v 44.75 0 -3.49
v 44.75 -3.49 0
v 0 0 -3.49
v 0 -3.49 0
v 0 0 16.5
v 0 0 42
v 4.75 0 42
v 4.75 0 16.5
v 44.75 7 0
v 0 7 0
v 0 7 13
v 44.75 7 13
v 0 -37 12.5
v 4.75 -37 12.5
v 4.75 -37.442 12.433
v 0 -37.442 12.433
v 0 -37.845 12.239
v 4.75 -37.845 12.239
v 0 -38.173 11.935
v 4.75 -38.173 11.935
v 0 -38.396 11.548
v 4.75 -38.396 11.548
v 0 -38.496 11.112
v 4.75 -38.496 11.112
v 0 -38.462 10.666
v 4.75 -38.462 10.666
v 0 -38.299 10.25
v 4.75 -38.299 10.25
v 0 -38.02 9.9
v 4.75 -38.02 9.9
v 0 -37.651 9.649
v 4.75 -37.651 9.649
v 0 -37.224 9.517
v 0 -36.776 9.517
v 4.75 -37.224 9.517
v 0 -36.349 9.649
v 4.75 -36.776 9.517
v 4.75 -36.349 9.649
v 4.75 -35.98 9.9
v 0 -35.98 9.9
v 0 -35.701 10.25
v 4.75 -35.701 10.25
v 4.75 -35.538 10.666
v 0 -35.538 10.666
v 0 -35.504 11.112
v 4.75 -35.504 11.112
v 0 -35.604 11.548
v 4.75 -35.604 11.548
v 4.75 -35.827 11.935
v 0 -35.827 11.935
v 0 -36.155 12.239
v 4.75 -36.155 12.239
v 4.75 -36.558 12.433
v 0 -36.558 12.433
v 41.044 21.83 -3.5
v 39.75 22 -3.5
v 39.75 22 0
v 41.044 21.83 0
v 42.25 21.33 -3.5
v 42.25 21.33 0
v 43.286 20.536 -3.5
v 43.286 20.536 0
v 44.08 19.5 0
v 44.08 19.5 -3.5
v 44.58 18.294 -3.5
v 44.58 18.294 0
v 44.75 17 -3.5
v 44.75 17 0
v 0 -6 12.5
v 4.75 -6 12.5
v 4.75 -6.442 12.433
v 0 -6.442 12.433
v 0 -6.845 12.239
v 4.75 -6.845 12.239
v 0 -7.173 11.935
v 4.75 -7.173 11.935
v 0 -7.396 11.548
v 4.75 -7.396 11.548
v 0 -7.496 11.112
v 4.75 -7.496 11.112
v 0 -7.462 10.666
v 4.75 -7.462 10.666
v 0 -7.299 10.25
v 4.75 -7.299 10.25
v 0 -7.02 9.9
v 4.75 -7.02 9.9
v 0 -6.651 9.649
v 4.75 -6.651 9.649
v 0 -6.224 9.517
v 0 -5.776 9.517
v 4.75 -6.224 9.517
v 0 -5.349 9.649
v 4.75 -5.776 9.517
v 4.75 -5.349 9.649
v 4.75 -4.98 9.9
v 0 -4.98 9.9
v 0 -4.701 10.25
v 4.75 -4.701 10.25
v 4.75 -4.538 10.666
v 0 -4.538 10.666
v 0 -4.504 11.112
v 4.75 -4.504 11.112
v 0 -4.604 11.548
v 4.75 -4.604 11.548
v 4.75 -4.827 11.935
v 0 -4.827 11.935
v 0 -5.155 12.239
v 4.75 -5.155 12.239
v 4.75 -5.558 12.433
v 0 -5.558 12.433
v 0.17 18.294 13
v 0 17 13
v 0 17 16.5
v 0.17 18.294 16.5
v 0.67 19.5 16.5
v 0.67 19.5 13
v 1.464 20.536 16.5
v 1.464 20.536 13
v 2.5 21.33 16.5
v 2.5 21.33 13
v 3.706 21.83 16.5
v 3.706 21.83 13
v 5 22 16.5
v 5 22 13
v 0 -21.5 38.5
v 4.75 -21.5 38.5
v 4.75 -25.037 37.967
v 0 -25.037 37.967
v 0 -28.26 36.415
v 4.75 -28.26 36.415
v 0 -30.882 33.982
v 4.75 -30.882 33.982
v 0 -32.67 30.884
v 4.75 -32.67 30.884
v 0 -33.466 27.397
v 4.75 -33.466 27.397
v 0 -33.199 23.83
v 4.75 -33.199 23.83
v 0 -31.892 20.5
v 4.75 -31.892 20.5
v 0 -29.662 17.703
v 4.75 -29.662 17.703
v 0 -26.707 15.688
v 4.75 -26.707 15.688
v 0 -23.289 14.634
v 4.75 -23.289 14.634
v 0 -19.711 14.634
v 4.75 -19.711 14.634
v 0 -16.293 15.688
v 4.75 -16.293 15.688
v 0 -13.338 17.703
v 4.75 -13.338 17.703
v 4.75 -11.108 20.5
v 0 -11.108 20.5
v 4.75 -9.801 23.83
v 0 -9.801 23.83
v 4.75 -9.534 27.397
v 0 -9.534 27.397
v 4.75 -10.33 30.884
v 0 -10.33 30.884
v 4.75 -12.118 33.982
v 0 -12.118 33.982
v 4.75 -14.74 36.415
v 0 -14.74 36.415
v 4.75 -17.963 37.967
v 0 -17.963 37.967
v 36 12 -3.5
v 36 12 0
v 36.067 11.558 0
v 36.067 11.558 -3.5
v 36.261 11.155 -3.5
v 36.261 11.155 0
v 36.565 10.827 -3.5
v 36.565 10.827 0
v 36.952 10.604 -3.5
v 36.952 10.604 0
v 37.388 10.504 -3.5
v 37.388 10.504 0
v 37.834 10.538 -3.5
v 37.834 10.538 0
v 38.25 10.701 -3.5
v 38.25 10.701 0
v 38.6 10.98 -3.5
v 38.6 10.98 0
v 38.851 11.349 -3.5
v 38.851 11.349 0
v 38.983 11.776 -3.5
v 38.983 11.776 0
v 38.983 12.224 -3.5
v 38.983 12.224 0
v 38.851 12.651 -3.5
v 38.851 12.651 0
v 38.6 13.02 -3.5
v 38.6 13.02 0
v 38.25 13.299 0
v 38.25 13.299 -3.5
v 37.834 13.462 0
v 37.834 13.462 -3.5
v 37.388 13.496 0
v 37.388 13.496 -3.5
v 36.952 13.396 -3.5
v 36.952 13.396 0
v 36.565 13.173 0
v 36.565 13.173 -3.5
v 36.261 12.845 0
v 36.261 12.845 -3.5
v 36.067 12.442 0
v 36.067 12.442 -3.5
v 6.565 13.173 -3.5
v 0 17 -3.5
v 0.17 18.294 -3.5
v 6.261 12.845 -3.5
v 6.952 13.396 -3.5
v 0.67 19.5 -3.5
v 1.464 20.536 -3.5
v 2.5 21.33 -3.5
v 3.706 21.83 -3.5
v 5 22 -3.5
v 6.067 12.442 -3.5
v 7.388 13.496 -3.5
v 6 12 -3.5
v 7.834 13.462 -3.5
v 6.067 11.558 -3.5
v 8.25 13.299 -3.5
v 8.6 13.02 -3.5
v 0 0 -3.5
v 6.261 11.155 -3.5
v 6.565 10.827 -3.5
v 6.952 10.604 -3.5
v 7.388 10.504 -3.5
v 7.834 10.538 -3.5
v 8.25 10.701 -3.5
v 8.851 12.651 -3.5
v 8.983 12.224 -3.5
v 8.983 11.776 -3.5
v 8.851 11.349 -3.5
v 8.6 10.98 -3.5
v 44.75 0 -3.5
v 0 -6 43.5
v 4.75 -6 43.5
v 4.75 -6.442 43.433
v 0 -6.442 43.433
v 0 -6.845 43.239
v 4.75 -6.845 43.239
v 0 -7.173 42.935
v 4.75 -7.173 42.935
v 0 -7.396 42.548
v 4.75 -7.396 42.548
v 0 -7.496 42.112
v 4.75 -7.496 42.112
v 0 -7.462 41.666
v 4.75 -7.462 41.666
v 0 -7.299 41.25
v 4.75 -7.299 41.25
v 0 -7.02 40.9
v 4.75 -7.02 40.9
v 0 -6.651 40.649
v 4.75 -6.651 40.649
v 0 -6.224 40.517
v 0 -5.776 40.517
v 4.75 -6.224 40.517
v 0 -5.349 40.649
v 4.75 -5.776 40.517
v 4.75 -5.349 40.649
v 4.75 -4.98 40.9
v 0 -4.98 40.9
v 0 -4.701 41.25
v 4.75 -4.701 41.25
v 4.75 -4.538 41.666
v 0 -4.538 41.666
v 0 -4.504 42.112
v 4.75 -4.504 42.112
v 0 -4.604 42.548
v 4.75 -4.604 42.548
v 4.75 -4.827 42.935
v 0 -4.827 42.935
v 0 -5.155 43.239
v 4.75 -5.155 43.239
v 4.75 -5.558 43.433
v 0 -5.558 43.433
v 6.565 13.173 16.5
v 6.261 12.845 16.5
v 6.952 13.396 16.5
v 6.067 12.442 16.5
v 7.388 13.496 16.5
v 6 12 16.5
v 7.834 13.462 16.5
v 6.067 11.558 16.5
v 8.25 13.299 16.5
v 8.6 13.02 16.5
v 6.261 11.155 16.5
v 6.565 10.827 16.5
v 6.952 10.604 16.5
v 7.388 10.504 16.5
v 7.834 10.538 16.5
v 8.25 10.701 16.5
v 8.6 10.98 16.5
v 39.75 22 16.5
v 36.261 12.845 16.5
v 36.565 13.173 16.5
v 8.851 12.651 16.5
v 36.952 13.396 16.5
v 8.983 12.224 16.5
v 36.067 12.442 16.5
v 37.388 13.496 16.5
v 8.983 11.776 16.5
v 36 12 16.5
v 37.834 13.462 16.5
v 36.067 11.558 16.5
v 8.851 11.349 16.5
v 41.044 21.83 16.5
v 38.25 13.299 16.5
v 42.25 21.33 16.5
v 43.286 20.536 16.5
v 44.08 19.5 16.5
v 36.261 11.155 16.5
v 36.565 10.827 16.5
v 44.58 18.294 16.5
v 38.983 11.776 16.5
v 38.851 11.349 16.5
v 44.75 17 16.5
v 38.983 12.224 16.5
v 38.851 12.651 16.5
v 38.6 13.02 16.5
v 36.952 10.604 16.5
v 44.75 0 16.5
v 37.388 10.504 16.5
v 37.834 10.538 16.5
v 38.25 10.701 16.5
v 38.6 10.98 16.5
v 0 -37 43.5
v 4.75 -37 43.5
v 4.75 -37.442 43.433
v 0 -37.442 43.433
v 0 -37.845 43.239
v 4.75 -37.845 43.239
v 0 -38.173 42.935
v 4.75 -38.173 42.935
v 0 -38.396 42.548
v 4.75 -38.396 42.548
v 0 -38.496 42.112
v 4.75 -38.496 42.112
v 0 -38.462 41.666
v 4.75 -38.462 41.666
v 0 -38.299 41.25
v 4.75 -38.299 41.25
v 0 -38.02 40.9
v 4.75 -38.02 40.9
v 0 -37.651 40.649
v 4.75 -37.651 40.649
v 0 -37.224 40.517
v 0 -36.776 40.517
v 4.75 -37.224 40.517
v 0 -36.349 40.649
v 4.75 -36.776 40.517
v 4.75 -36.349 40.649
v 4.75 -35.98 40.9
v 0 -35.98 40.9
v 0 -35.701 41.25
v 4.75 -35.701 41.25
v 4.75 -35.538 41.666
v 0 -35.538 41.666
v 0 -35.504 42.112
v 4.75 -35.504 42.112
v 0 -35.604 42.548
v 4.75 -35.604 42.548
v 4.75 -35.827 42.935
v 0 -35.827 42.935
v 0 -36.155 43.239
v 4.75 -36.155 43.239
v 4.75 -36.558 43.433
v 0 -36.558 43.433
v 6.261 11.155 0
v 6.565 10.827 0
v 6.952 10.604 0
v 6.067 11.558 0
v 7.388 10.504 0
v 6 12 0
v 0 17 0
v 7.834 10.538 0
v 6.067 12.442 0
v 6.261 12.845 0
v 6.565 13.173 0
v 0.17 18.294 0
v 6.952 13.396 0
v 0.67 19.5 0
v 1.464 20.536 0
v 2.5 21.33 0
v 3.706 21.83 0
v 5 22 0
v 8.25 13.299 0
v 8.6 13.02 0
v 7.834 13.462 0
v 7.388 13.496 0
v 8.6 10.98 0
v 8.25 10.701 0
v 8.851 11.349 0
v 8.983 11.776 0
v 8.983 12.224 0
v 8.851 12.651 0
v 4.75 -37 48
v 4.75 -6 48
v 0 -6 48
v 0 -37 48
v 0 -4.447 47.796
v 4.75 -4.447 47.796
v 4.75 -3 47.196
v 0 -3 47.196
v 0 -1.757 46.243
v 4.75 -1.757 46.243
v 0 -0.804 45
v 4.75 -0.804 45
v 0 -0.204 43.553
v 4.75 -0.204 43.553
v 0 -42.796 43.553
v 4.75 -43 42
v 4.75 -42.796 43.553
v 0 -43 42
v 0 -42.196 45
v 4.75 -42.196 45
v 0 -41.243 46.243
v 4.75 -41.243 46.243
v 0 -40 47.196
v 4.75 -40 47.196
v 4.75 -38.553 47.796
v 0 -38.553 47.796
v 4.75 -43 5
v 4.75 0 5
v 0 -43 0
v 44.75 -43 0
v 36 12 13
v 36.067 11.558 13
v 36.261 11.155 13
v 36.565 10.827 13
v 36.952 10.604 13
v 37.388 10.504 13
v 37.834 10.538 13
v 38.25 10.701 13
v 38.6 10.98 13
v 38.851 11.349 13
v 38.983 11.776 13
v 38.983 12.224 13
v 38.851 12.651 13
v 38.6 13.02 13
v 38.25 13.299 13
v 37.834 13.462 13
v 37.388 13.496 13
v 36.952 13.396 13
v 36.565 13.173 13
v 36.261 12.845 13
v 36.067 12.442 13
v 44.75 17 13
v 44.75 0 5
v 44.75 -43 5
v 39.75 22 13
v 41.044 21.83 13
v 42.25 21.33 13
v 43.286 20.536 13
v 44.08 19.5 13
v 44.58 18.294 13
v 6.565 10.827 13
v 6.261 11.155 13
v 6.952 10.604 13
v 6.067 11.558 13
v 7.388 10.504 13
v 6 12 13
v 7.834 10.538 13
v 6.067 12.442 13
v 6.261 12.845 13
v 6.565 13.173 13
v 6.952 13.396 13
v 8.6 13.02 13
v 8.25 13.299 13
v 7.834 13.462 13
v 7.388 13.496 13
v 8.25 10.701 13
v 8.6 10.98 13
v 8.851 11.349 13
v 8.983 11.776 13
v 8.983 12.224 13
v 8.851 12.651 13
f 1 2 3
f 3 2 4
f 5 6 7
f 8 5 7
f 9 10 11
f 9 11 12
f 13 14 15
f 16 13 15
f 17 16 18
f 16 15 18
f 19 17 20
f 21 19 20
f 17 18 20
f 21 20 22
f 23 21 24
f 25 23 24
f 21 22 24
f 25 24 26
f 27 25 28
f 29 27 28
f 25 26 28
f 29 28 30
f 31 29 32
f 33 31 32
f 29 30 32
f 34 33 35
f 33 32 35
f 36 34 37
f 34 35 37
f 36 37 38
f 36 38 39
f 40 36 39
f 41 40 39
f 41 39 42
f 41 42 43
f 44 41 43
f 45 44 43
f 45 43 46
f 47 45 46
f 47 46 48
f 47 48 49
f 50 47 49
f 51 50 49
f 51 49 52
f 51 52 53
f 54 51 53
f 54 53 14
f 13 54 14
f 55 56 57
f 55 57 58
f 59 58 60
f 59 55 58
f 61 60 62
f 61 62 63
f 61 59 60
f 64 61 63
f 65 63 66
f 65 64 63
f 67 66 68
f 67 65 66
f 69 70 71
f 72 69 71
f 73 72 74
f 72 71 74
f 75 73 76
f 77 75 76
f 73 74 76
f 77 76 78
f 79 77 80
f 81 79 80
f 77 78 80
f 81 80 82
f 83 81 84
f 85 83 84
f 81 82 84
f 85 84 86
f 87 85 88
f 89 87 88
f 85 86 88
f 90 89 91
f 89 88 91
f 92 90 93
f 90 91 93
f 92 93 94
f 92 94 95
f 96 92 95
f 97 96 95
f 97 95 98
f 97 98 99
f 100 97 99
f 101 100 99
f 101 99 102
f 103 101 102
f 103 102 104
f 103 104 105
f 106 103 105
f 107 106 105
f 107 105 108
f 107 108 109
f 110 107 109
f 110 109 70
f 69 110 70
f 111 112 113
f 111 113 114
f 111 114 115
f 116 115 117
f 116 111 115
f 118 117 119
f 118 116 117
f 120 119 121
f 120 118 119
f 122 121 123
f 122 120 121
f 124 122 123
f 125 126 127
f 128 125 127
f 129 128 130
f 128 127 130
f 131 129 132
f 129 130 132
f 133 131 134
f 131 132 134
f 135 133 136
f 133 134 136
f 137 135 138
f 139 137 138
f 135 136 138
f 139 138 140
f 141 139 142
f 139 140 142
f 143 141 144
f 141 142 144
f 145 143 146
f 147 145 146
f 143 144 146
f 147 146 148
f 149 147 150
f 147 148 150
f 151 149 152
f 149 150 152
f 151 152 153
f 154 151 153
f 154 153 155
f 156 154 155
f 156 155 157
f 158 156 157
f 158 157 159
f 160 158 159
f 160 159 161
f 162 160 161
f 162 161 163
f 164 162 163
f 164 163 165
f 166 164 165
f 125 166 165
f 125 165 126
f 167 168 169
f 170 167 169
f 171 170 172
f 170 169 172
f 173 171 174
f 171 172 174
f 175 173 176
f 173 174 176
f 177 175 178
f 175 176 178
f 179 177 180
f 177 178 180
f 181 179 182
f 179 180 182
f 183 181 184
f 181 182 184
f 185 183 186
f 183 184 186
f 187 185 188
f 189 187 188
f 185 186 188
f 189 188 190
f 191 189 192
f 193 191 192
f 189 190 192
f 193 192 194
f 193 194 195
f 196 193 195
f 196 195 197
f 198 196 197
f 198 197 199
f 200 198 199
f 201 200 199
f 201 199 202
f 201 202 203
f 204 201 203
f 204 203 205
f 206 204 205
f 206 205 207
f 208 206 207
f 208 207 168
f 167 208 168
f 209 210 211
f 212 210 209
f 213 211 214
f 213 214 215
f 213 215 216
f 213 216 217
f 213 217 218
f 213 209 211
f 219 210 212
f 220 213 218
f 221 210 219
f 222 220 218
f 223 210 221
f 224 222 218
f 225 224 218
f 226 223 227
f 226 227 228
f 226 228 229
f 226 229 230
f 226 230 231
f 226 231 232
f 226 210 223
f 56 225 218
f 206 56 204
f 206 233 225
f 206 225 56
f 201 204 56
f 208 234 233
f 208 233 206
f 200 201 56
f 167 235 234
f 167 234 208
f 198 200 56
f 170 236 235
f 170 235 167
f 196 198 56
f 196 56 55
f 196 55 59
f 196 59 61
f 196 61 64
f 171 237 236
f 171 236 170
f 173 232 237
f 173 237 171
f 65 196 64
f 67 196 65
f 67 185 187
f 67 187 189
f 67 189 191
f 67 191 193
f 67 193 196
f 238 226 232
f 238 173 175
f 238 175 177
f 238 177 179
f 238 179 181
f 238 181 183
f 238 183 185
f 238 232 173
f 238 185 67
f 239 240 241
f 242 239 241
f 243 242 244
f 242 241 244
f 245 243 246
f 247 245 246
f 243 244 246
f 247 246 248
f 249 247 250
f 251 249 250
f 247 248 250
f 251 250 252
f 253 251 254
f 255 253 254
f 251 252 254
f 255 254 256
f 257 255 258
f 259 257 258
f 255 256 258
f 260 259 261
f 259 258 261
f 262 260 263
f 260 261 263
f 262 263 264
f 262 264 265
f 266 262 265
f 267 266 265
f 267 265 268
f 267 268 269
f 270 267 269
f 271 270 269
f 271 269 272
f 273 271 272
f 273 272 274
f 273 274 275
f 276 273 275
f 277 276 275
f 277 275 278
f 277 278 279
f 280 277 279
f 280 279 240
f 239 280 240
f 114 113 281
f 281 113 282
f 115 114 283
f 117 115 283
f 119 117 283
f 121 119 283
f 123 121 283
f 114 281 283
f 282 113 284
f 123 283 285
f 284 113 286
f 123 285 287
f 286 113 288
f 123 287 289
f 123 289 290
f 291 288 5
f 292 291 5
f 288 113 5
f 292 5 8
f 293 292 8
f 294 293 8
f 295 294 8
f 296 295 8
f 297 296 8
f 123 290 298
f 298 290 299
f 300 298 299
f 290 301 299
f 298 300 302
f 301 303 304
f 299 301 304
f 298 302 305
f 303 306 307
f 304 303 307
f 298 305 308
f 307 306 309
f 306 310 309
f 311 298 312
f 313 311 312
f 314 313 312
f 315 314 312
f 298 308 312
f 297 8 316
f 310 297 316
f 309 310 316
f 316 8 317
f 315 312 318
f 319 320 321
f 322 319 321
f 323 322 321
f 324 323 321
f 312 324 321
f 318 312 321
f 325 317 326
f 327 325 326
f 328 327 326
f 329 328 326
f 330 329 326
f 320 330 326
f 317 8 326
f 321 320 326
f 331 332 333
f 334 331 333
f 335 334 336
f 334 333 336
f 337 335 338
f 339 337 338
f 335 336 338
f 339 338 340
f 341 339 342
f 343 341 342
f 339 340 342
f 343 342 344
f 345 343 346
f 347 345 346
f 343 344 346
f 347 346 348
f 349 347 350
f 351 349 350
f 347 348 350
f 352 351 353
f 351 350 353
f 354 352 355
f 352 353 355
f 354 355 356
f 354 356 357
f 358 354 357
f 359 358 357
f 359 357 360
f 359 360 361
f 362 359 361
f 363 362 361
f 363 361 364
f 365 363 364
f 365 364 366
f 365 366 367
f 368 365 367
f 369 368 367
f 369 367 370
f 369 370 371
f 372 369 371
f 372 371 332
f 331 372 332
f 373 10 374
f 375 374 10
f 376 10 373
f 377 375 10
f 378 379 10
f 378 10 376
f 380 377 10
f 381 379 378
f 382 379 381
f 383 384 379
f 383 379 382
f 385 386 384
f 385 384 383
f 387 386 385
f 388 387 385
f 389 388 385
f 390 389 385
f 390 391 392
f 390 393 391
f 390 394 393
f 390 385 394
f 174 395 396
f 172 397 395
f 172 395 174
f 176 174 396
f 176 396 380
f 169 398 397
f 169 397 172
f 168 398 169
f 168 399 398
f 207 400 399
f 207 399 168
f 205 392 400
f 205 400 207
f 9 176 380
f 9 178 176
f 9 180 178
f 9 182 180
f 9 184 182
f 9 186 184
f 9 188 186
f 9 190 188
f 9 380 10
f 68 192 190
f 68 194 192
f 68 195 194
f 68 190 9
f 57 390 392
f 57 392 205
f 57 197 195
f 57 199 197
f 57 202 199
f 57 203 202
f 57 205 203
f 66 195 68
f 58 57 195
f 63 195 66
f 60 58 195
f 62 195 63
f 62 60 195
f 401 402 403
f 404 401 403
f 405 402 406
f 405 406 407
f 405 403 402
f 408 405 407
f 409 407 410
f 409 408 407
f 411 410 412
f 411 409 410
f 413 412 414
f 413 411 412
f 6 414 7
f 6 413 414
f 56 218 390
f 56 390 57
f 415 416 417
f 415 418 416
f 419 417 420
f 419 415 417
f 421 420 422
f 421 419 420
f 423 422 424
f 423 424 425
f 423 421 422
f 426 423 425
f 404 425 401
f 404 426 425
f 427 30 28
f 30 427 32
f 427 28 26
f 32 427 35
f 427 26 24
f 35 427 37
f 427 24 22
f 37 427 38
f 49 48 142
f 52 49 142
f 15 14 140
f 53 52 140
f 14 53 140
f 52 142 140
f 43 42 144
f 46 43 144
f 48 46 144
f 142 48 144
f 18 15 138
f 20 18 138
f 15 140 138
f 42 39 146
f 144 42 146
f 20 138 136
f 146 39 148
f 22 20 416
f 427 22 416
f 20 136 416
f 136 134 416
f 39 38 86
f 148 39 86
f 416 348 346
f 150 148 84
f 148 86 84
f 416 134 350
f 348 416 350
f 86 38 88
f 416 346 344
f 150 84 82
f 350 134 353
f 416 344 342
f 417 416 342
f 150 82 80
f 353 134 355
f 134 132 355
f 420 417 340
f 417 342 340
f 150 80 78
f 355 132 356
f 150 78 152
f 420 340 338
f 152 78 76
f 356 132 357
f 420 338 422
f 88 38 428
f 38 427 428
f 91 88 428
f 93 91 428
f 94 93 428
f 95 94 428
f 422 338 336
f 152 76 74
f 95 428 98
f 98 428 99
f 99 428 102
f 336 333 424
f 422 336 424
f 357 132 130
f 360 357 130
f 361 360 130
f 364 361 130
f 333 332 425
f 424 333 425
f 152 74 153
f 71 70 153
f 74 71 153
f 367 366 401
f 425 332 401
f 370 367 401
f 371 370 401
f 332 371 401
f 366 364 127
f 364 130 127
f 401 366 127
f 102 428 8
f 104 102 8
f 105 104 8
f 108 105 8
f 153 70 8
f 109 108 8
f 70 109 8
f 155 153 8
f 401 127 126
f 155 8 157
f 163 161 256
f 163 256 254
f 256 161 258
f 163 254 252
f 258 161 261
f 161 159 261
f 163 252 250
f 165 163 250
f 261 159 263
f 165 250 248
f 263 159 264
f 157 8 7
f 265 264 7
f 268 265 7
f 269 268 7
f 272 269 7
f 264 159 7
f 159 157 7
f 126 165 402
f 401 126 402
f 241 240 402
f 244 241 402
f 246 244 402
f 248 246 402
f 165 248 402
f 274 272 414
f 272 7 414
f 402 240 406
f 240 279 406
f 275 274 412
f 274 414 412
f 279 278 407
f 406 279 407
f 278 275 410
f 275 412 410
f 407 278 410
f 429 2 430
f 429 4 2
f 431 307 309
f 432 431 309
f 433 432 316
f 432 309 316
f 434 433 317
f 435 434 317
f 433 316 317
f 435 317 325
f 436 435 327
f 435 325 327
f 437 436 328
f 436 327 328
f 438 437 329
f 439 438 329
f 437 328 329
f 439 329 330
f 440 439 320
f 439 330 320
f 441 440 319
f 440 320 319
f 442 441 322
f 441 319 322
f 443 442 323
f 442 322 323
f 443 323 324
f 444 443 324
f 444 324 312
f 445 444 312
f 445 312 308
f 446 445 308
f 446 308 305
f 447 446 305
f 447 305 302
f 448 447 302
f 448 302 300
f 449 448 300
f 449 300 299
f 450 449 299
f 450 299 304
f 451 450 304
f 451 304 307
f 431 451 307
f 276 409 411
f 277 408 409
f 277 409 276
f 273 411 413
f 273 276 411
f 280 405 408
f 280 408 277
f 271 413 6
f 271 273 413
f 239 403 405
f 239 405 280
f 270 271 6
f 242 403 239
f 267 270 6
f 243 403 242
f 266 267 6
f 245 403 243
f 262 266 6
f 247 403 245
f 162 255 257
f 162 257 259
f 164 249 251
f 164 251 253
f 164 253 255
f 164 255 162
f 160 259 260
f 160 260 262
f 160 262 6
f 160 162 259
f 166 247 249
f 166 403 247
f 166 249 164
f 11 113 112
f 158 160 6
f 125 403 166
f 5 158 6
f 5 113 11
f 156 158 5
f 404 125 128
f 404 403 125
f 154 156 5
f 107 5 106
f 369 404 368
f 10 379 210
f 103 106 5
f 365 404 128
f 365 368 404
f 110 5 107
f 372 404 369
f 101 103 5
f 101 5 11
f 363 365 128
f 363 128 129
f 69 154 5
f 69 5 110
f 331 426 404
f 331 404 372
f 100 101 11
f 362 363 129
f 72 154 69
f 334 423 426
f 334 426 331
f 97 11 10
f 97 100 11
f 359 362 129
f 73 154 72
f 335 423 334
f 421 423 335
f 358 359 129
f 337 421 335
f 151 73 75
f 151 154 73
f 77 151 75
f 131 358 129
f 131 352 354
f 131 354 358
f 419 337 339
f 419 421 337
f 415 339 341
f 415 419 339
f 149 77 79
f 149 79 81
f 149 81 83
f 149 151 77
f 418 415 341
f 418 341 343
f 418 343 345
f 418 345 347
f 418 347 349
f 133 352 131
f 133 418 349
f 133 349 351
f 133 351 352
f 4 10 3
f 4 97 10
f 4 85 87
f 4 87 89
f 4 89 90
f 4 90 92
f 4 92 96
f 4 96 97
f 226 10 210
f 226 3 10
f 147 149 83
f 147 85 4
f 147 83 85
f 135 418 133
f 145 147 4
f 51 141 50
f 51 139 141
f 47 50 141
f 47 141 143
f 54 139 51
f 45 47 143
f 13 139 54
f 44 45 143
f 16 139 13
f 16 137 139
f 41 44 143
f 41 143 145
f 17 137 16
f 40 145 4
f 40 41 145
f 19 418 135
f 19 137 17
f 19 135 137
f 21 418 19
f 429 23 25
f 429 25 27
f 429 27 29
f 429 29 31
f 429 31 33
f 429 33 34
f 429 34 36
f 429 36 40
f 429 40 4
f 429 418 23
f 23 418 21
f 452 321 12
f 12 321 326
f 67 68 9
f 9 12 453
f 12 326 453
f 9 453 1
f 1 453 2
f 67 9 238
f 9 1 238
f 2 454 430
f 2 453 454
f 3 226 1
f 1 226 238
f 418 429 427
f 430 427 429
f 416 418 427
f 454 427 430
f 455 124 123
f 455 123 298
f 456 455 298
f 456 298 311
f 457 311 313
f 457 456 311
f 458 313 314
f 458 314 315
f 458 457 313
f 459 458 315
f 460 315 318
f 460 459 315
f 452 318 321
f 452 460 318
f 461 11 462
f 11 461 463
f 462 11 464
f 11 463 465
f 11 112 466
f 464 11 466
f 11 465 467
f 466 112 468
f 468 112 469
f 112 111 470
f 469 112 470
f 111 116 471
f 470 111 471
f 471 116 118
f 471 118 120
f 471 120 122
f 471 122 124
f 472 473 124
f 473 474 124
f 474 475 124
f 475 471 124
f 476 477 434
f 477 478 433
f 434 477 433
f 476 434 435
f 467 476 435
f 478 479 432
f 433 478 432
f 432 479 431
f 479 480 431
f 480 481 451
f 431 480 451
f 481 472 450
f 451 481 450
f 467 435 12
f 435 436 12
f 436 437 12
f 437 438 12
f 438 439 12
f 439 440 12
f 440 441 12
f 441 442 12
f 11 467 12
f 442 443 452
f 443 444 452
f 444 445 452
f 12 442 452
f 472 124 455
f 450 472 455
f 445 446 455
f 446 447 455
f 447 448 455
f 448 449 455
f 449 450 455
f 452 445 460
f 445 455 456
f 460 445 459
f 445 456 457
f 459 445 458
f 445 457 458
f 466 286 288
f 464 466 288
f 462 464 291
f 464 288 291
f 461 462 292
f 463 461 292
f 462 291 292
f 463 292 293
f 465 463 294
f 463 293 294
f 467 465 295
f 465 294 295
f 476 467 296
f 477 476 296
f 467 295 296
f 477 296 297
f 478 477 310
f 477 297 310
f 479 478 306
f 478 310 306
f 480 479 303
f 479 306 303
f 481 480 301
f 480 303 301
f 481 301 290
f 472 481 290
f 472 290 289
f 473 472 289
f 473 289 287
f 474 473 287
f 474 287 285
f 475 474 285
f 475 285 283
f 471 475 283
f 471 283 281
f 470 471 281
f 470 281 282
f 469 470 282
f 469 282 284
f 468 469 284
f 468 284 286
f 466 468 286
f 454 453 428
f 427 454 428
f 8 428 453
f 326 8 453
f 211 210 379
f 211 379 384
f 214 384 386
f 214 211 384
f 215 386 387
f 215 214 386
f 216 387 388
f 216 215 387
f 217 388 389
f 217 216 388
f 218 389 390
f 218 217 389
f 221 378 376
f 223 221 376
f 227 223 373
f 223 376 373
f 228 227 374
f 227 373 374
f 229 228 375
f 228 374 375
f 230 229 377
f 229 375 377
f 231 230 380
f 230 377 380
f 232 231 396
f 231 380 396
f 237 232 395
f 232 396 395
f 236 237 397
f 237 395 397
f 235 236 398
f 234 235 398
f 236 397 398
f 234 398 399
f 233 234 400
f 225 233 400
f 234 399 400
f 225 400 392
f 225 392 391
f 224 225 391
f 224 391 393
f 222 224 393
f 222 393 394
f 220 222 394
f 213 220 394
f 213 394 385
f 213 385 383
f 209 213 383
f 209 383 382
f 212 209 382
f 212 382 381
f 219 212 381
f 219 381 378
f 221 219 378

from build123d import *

# Parameters (mm, degrees)
PAD_DEPTH       = 43
SKETCH001_R     = 12
SKETCH001_R_2   = 1.5
POCKET_DEPTH    = 5
POCKET_FACE5_W  = 43
POCKET_FACE5_H  = 44.75
POCKET001_DEPTH = 15.5
SKETCH002_W     = 44.75
SKETCH002_H     = 20
PAD001_DEPTH    = 7
SKETCH003_W     = 44.75
SKETCH003_H     = 4.5
PAD002_DEPTH    = 15
SKETCH004_R     = 1.5
POCKET002_DEPTH = 20.001
CHAMFER_SIZE    = 3.49
FILLET_R        = 6
FILLET001_R     = 5
SKETCH005_W     = 48.7
SKETCH005_H     = 13
POCKET003_DEPTH = 15


with BuildPart() as part:
    # Sketch → Pad (new body)
    with BuildSketch(Plane.XZ):
        Polygon((0, 48), (0, -15.5), (44.75, -15.5), (44.75, -10.5), (4.75, -10.5), (4.75, 0), (44.75, 0), (44.75, 5), (4.75, 5), (4.75, 48), align=None)
    extrude(amount=PAD_DEPTH)

    # Sketch001 → Pocket (cut)
    with BuildSketch(Plane(origin=(4.75, 0, 0), x_dir=(0, 0, 1), z_dir=(1, 0, 0))):
        with Locations((26.5, 21.5)):
            Circle(SKETCH001_R)
        with Locations((11, 6)):
            Circle(SKETCH001_R_2)
        with Locations((11, 37)):
            Circle(SKETCH001_R_2)
        with Locations((42, 37)):
            Circle(SKETCH001_R_2)
        with Locations((42, 6)):
            Circle(SKETCH001_R_2)
    extrude(amount=-POCKET_DEPTH, mode=Mode.SUBTRACT)

    # Pocket Face5 → Pocket001 (cut)
    with BuildSketch(Plane(origin=(22.375, -21.5, -15.5), x_dir=(0, -1, 0), z_dir=(0, 0, -1))):
        Rectangle(POCKET_FACE5_W, POCKET_FACE5_H)
    extrude(amount=-POCKET001_DEPTH, mode=Mode.SUBTRACT)

    # Sketch002 (on Face2 of Pocket001) → Pad001 (join)
    with BuildSketch(Plane(origin=(0, 0, 0), x_dir=(1, 0, 0), z_dir=(0, 1, 0))):
        with Locations((22.375, -6.5)):
            Rectangle(SKETCH002_W, SKETCH002_H)
    extrude(amount=PAD001_DEPTH)

    # Sketch003 (on Face14 of Pad001) → Pad002 (join)
    with BuildSketch(Plane(origin=(0, 7, 0), x_dir=(1, 0, 0), z_dir=(0, 1, 0))):
        with Locations((22.375, -14.25)):
            Rectangle(SKETCH003_W, SKETCH003_H)
        with Locations((22.375, 1.25)):
            Rectangle(SKETCH003_W, SKETCH003_H)
    extrude(amount=PAD002_DEPTH)

    # Sketch004 (on Face22 of Pad002) → Pocket002 (cut, through all)
    with BuildSketch(Plane(origin=(0, 0, 16.5), x_dir=(-1, 0, 0), z_dir=(0, 0, 1))):
        with Locations((-37.5, -12)):
            Circle(SKETCH004_R)
        with Locations((-7.5, -12)):
            Circle(SKETCH004_R)
    extrude(amount=-POCKET002_DEPTH, mode=Mode.SUBTRACT)

    # Chamfer
    chamfer_edges = [part.edges().sort_by_distance(p)[0] for p in [
        (22.375, 0, 0),
    ]]
    chamfer(chamfer_edges, length=CHAMFER_SIZE)

    # Fillet
    fillet_edges = [part.edges().sort_by_distance(p)[0] for p in [
        (2.375, -43, 48),
        (2.375, 0, 48),
    ]]
    fillet(fillet_edges, radius=FILLET_R)

    # Fillet001
    fillet001_edges = [part.edges().sort_by_distance(p)[0] for p in [
        (0, 22, 14.25),
        (0, 22, -1.25),
        (44.75, 22, 14.25),
        (44.75, 22, -1.25),
    ]]
    fillet(fillet001_edges, radius=FILLET001_R)

    # Sketch005 (on Face28 of Fillet001) → Pocket003 (cut)
    with BuildSketch(Plane(origin=(0, 22, 0), x_dir=(1, 0, 0), z_dir=(0, 1, 0))):
        with Locations((24.35, -6.5)):
            Rectangle(SKETCH005_W, SKETCH005_H)
    extrude(amount=-POCKET003_DEPTH, mode=Mode.SUBTRACT)


solid = part.part
